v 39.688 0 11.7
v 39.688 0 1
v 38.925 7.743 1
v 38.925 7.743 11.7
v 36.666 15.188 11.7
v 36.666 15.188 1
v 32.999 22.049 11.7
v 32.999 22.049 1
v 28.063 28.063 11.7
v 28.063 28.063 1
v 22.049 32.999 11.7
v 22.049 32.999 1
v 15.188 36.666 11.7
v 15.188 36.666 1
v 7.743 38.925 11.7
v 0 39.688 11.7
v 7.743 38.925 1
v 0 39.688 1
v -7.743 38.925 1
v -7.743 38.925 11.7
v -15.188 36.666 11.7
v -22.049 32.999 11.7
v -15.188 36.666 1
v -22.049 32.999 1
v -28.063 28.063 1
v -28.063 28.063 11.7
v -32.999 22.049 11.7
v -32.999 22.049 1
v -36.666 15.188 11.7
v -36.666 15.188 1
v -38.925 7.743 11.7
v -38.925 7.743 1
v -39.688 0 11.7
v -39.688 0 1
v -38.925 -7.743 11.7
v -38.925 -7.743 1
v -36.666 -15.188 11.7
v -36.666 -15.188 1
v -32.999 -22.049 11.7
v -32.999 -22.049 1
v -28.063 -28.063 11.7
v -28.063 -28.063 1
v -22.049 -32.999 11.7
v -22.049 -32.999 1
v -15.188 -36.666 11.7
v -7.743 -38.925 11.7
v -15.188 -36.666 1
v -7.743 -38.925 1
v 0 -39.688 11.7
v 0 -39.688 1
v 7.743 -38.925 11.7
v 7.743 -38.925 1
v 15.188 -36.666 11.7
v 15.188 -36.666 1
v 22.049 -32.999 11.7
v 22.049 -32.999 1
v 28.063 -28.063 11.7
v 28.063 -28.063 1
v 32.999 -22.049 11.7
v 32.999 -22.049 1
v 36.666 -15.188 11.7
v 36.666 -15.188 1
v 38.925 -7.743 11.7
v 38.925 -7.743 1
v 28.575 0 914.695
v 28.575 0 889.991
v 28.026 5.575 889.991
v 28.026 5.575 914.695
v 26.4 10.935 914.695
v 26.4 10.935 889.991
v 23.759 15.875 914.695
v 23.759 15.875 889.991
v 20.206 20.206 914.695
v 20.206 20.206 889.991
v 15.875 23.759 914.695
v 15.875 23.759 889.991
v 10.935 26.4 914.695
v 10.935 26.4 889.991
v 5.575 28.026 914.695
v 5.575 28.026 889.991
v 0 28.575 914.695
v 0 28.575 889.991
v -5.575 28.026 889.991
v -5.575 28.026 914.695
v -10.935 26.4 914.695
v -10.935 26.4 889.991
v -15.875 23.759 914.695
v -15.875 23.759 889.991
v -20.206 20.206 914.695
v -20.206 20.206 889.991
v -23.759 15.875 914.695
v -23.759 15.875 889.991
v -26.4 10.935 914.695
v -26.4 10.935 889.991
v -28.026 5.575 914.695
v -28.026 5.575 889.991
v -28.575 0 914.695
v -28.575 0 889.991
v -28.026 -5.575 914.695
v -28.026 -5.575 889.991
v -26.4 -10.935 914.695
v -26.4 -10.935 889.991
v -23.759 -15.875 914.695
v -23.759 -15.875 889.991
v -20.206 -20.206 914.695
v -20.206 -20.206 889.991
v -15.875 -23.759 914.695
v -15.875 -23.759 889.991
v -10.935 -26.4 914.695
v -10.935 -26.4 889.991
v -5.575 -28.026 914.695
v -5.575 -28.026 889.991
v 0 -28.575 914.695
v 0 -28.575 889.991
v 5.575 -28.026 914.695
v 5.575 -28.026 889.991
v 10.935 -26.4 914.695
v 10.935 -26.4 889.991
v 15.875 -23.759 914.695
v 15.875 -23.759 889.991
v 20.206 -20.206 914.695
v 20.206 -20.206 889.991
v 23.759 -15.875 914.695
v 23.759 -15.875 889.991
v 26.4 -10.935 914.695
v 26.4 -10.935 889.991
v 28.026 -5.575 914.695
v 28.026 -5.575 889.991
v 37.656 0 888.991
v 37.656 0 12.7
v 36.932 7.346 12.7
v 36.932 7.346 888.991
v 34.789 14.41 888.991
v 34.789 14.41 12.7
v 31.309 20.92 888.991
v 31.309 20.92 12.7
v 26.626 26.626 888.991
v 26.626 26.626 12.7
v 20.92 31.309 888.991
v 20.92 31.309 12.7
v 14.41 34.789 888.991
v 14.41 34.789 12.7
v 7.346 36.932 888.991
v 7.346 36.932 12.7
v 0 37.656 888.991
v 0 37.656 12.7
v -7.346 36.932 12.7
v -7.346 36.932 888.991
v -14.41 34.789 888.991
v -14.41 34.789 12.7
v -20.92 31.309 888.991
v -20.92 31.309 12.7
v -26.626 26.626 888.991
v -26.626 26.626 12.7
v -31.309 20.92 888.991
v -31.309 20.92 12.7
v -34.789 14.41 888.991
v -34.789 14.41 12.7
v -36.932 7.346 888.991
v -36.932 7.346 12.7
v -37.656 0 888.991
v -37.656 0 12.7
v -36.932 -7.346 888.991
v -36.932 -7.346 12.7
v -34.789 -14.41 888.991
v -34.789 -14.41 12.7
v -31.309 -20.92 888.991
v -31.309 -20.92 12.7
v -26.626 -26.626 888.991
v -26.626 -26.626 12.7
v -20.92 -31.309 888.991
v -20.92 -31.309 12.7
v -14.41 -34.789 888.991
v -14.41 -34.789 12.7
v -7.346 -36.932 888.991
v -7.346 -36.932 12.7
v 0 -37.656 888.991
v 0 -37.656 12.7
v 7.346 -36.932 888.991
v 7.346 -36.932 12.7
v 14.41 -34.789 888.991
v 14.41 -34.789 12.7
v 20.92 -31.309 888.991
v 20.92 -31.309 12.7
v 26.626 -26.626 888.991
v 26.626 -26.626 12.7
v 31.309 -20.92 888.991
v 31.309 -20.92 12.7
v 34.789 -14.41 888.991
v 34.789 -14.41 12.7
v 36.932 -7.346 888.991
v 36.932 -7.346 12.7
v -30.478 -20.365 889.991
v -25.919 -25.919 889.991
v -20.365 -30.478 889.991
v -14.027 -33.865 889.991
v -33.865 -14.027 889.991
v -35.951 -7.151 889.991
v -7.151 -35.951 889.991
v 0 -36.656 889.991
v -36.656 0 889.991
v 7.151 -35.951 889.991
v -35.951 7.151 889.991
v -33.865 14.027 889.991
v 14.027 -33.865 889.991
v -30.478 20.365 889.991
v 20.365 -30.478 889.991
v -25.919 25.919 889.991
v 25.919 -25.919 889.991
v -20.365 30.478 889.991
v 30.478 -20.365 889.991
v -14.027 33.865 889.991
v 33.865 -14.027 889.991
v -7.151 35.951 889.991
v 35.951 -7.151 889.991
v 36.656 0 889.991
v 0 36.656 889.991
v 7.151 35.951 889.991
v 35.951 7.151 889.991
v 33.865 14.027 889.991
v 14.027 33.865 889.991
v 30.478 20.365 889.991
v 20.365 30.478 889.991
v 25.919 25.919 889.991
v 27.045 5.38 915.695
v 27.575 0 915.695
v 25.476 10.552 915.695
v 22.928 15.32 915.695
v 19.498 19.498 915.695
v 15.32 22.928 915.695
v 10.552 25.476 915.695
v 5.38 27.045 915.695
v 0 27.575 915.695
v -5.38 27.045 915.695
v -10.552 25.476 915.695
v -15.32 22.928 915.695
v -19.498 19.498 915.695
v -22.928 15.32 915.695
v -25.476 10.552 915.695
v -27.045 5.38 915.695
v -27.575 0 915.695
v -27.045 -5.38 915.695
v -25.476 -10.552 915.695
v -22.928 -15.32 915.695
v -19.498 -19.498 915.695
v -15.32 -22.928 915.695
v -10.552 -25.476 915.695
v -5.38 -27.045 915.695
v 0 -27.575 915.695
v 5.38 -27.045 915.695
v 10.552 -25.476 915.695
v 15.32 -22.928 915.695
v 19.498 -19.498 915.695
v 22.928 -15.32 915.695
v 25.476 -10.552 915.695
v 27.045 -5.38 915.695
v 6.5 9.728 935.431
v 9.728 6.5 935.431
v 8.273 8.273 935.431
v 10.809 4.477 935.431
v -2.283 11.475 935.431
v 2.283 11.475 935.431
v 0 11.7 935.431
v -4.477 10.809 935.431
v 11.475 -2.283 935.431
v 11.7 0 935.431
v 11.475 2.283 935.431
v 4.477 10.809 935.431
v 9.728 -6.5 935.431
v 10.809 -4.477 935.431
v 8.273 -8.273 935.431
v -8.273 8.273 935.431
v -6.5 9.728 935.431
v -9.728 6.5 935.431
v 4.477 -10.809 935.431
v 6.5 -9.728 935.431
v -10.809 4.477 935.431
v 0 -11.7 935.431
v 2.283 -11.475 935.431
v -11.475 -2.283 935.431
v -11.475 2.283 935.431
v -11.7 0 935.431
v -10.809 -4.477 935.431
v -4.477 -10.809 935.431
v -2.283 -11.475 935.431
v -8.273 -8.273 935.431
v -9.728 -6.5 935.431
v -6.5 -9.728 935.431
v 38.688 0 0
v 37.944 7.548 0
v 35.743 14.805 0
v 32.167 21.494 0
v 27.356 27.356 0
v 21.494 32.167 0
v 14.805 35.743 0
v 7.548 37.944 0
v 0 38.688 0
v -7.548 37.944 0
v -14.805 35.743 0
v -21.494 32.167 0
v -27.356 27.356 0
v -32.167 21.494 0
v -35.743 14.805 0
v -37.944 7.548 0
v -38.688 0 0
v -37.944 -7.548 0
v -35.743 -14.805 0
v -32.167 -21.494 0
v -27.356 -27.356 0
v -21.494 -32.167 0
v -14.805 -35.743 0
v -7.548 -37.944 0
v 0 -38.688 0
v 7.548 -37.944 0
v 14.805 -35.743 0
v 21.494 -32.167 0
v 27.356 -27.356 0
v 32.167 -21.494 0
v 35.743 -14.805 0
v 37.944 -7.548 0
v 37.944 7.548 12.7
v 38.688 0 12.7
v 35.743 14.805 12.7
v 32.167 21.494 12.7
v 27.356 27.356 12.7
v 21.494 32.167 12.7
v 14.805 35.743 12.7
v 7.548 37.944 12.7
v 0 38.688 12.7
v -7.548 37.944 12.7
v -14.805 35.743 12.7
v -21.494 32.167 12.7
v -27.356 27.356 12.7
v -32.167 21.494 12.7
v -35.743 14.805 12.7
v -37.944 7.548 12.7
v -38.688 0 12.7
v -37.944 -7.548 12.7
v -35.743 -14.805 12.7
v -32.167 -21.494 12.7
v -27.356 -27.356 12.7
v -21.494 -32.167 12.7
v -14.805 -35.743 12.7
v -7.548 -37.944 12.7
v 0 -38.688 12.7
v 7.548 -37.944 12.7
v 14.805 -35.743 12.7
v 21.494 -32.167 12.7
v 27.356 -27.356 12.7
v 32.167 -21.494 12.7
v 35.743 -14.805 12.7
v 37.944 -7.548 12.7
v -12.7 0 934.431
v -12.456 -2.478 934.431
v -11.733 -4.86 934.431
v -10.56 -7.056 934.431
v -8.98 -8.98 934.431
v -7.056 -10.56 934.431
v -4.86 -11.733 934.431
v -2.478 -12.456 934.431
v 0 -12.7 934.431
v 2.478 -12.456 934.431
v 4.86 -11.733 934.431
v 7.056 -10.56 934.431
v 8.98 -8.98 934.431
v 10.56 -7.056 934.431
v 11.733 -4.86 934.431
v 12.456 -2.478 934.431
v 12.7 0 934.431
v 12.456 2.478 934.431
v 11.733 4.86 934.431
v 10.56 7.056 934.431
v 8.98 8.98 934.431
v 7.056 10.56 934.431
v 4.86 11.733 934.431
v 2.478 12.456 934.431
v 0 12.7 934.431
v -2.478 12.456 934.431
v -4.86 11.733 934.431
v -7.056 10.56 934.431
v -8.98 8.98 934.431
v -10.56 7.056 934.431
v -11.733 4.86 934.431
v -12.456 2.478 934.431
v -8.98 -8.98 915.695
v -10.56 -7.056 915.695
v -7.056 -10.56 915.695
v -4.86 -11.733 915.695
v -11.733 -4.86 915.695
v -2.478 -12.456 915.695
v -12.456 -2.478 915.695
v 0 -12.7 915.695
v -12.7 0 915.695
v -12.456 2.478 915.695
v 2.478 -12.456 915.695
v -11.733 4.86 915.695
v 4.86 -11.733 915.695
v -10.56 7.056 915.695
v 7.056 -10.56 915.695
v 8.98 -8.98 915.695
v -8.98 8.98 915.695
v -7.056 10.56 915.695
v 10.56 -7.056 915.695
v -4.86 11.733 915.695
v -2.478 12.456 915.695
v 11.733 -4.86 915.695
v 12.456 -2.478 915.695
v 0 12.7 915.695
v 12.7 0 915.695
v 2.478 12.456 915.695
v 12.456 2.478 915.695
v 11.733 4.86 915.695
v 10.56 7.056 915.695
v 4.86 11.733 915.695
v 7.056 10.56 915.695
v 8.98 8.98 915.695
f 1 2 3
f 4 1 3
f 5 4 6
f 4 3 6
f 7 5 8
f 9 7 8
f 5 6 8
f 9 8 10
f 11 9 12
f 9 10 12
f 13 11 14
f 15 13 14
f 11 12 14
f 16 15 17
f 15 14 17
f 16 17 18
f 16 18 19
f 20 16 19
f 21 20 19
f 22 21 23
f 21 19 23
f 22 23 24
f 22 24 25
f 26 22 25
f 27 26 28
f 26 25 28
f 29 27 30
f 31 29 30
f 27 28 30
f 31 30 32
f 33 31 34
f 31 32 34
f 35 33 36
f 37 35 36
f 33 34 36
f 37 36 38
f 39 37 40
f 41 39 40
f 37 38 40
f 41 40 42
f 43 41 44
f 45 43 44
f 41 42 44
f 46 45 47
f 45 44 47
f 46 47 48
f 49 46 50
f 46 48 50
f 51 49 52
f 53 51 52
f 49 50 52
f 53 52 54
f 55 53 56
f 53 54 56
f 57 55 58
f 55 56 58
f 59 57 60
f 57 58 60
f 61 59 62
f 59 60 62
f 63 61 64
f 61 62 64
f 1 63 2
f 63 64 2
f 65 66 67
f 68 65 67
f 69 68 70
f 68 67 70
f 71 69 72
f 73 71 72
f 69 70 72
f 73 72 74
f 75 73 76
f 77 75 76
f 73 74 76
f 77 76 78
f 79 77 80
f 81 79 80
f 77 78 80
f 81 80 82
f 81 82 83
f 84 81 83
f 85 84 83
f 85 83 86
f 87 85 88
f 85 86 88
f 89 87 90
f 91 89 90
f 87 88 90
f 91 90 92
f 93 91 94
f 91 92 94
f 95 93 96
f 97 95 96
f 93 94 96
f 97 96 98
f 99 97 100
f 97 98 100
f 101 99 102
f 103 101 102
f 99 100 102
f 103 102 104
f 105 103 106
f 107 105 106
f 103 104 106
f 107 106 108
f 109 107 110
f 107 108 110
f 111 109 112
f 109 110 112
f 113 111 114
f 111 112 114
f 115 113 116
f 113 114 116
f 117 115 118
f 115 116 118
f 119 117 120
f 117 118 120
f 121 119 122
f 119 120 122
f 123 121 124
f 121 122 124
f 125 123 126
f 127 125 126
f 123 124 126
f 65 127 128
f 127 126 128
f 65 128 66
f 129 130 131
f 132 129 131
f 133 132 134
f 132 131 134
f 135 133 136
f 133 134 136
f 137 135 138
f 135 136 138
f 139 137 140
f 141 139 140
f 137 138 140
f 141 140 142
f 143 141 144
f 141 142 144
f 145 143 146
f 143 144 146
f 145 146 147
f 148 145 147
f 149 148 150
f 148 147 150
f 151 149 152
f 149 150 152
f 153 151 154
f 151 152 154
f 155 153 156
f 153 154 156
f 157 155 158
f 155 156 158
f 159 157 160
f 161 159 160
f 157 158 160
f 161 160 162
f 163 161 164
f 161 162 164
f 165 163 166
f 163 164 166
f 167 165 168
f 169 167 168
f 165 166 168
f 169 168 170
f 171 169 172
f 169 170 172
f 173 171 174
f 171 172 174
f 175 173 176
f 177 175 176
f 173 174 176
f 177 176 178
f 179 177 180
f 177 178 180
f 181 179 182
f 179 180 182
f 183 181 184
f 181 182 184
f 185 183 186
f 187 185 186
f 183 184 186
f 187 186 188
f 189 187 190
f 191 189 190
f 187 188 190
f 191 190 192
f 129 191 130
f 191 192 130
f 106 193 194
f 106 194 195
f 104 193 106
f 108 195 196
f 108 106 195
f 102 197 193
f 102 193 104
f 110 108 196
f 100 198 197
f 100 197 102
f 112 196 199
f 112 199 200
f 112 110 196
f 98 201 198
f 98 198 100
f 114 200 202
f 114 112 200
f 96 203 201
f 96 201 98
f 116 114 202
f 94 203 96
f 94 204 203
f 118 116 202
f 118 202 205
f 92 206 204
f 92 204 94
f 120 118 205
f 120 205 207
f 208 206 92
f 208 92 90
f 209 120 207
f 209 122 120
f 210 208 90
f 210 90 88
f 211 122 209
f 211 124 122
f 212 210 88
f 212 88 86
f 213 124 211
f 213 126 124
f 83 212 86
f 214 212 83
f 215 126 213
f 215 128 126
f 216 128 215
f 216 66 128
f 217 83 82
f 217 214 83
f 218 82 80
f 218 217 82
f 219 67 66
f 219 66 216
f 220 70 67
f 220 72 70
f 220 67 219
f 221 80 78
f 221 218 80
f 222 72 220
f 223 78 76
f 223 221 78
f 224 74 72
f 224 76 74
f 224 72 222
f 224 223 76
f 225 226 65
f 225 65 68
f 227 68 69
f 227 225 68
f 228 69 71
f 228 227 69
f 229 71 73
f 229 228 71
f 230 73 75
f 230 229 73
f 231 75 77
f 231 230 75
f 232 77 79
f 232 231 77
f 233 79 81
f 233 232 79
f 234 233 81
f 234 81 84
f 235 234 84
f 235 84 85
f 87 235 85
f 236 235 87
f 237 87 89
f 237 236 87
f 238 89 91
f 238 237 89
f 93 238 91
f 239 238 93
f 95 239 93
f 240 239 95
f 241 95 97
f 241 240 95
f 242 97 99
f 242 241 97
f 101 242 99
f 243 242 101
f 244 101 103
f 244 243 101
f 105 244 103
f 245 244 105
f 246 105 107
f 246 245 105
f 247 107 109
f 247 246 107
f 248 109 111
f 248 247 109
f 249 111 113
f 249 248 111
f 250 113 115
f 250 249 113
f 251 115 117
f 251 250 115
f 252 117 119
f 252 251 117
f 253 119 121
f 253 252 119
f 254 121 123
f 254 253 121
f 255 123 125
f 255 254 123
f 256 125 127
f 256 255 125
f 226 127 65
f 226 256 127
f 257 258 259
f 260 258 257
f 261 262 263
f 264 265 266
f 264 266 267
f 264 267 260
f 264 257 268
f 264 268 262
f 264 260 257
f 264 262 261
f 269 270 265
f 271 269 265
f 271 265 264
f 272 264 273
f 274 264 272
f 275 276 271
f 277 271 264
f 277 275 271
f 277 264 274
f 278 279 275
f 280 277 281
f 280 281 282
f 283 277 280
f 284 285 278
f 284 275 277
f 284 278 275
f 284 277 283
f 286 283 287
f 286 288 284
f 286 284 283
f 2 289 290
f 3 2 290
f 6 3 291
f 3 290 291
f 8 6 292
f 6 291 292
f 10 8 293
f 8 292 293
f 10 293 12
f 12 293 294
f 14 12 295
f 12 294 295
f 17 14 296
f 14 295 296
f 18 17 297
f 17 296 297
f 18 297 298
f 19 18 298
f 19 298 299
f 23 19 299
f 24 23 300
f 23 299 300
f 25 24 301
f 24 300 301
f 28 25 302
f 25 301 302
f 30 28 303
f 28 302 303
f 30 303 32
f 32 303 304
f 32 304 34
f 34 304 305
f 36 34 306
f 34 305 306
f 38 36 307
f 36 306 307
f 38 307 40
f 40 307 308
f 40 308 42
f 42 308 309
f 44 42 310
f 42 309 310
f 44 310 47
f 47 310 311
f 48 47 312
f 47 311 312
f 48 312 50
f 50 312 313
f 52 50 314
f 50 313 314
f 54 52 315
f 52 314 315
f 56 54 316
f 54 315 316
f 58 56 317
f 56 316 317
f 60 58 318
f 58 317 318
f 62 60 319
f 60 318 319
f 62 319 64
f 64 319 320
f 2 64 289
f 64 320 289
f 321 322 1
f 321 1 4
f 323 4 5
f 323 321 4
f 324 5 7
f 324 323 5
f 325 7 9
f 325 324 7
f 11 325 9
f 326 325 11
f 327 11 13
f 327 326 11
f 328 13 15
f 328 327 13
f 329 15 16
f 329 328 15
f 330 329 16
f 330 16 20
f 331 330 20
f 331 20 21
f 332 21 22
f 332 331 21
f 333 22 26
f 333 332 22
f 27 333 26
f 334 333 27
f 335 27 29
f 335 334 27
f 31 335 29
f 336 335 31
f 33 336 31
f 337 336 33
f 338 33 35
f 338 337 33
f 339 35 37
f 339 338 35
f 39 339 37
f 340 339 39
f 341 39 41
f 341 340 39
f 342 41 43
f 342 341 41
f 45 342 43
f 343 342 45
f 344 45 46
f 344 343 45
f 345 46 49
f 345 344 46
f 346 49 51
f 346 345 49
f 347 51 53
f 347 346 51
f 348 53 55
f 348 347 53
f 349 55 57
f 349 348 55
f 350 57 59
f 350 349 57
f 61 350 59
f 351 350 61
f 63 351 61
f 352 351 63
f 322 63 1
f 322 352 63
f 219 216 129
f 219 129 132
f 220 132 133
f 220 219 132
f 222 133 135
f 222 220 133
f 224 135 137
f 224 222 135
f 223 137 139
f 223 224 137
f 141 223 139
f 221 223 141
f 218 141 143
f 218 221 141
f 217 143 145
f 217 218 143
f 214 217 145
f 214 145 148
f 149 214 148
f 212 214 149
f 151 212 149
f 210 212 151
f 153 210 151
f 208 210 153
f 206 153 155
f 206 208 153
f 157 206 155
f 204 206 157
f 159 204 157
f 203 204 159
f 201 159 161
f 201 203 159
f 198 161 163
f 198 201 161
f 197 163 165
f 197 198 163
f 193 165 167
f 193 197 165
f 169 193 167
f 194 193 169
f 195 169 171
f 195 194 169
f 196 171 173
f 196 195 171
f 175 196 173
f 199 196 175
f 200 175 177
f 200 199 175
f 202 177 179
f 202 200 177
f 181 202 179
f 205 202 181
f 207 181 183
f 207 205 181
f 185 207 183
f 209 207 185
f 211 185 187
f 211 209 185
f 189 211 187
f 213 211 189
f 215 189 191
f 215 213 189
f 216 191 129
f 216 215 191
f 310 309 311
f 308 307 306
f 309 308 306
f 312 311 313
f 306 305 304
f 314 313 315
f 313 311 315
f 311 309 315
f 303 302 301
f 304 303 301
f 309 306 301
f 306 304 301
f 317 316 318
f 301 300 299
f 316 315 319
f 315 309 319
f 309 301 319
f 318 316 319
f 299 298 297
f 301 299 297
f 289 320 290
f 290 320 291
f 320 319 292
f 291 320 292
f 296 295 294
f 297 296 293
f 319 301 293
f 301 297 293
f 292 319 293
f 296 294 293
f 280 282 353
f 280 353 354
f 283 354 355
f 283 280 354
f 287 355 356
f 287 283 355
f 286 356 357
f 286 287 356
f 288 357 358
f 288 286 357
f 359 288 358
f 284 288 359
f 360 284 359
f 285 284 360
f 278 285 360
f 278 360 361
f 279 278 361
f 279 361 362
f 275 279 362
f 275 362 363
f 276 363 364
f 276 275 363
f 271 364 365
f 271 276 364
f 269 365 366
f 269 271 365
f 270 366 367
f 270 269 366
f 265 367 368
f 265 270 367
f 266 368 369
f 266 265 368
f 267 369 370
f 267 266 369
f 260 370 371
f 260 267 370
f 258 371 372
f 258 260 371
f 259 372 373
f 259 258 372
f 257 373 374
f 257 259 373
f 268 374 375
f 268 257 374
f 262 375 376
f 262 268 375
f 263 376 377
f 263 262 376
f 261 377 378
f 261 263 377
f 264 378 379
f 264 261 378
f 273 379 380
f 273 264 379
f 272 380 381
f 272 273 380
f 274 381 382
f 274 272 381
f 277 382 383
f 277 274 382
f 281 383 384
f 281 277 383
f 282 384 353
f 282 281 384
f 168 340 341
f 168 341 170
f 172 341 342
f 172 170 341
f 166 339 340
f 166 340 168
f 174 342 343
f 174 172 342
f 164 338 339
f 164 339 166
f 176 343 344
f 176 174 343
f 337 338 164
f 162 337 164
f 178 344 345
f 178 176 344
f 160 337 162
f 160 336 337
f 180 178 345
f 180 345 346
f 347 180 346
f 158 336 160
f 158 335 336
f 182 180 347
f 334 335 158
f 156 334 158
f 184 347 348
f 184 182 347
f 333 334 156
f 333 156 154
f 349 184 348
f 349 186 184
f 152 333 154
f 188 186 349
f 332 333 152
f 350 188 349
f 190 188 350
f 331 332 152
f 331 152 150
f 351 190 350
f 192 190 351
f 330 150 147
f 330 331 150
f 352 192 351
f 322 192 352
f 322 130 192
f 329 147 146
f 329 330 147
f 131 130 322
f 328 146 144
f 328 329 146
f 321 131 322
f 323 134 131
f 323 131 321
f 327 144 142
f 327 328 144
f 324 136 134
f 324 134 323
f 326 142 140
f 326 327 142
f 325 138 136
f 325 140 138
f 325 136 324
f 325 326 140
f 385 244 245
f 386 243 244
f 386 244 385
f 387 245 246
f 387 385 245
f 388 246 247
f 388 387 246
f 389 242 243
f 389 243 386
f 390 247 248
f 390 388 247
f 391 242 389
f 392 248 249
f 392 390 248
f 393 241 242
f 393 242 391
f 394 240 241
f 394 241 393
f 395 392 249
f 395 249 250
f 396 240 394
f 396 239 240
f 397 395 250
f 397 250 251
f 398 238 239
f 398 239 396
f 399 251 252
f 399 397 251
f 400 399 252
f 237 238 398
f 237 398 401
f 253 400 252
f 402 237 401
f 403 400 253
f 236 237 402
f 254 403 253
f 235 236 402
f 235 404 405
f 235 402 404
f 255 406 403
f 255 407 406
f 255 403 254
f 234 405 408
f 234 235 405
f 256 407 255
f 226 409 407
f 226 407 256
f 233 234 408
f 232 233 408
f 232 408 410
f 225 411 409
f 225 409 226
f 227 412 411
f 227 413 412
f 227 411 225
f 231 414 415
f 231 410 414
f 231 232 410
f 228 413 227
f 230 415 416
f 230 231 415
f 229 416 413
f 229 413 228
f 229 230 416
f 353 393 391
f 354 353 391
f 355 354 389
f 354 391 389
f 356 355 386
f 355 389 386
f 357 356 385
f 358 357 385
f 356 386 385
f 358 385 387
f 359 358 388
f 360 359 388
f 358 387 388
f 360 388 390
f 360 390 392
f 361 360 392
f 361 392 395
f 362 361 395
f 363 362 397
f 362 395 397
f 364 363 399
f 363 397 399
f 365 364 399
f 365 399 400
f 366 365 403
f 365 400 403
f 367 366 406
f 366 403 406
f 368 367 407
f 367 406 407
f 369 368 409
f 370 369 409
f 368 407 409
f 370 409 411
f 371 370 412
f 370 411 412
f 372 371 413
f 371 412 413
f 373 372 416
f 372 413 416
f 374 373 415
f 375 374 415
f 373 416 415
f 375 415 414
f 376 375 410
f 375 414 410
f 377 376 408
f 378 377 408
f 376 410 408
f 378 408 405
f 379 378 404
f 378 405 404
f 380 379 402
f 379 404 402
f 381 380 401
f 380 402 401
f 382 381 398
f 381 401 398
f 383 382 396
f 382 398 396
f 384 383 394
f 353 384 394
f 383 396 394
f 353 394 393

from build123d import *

# Parameters (mm, degrees)
SKETCH1_R           = 39.6875
BOSS_EXTRUDE1_DEPTH = 12.7
SKETCH2_R           = 37.6555
BOSS_EXTRUDE2_DEPTH = 877.2906
SKETCH3_R           = 28.575
BOSS_EXTRUDE3_DEPTH = 25.7048
SKETCH4_R           = 12.7
BOSS_EXTRUDE4_DEPTH = 19.7358
CHAMFER1_SIZE       = 1


with BuildPart() as part:
    # Sketch1 → Boss-Extrude1 (new body)
    with BuildSketch(Plane.XY):
        Circle(SKETCH1_R)
    extrude(amount=BOSS_EXTRUDE1_DEPTH)

    # Sketch2 → Boss-Extrude2 (add)
    with BuildSketch(Plane.XY.offset(12.7)):
        Circle(SKETCH2_R)
    extrude(amount=BOSS_EXTRUDE2_DEPTH)

    # Sketch3 → Boss-Extrude3 (add)
    with BuildSketch(Plane.XY.offset(889.9906)):
        Circle(SKETCH3_R)
    extrude(amount=BOSS_EXTRUDE3_DEPTH)

    # Sketch4 → Boss-Extrude4 (add)
    with BuildSketch(Plane.XY.offset(915.6954)):
        with Locations(Location((0, 0, 0), (0, 0, 180))):
            Circle(SKETCH4_R)
    extrude(amount=BOSS_EXTRUDE4_DEPTH)

    # Chamfer1
    chamfer1_edges = [part.edges().sort_by_distance(p)[0] for p in [
        (-28.575, 0, 915.6954),
        (12.7, 0, 935.4312),
        (-39.6875, 0, 0),
        (-39.6875, 0, 12.7),
        (-37.6555, 0, 889.9906),
    ]]
    chamfer(chamfer1_edges, length=CHAMFER1_SIZE)


solid = part.part
